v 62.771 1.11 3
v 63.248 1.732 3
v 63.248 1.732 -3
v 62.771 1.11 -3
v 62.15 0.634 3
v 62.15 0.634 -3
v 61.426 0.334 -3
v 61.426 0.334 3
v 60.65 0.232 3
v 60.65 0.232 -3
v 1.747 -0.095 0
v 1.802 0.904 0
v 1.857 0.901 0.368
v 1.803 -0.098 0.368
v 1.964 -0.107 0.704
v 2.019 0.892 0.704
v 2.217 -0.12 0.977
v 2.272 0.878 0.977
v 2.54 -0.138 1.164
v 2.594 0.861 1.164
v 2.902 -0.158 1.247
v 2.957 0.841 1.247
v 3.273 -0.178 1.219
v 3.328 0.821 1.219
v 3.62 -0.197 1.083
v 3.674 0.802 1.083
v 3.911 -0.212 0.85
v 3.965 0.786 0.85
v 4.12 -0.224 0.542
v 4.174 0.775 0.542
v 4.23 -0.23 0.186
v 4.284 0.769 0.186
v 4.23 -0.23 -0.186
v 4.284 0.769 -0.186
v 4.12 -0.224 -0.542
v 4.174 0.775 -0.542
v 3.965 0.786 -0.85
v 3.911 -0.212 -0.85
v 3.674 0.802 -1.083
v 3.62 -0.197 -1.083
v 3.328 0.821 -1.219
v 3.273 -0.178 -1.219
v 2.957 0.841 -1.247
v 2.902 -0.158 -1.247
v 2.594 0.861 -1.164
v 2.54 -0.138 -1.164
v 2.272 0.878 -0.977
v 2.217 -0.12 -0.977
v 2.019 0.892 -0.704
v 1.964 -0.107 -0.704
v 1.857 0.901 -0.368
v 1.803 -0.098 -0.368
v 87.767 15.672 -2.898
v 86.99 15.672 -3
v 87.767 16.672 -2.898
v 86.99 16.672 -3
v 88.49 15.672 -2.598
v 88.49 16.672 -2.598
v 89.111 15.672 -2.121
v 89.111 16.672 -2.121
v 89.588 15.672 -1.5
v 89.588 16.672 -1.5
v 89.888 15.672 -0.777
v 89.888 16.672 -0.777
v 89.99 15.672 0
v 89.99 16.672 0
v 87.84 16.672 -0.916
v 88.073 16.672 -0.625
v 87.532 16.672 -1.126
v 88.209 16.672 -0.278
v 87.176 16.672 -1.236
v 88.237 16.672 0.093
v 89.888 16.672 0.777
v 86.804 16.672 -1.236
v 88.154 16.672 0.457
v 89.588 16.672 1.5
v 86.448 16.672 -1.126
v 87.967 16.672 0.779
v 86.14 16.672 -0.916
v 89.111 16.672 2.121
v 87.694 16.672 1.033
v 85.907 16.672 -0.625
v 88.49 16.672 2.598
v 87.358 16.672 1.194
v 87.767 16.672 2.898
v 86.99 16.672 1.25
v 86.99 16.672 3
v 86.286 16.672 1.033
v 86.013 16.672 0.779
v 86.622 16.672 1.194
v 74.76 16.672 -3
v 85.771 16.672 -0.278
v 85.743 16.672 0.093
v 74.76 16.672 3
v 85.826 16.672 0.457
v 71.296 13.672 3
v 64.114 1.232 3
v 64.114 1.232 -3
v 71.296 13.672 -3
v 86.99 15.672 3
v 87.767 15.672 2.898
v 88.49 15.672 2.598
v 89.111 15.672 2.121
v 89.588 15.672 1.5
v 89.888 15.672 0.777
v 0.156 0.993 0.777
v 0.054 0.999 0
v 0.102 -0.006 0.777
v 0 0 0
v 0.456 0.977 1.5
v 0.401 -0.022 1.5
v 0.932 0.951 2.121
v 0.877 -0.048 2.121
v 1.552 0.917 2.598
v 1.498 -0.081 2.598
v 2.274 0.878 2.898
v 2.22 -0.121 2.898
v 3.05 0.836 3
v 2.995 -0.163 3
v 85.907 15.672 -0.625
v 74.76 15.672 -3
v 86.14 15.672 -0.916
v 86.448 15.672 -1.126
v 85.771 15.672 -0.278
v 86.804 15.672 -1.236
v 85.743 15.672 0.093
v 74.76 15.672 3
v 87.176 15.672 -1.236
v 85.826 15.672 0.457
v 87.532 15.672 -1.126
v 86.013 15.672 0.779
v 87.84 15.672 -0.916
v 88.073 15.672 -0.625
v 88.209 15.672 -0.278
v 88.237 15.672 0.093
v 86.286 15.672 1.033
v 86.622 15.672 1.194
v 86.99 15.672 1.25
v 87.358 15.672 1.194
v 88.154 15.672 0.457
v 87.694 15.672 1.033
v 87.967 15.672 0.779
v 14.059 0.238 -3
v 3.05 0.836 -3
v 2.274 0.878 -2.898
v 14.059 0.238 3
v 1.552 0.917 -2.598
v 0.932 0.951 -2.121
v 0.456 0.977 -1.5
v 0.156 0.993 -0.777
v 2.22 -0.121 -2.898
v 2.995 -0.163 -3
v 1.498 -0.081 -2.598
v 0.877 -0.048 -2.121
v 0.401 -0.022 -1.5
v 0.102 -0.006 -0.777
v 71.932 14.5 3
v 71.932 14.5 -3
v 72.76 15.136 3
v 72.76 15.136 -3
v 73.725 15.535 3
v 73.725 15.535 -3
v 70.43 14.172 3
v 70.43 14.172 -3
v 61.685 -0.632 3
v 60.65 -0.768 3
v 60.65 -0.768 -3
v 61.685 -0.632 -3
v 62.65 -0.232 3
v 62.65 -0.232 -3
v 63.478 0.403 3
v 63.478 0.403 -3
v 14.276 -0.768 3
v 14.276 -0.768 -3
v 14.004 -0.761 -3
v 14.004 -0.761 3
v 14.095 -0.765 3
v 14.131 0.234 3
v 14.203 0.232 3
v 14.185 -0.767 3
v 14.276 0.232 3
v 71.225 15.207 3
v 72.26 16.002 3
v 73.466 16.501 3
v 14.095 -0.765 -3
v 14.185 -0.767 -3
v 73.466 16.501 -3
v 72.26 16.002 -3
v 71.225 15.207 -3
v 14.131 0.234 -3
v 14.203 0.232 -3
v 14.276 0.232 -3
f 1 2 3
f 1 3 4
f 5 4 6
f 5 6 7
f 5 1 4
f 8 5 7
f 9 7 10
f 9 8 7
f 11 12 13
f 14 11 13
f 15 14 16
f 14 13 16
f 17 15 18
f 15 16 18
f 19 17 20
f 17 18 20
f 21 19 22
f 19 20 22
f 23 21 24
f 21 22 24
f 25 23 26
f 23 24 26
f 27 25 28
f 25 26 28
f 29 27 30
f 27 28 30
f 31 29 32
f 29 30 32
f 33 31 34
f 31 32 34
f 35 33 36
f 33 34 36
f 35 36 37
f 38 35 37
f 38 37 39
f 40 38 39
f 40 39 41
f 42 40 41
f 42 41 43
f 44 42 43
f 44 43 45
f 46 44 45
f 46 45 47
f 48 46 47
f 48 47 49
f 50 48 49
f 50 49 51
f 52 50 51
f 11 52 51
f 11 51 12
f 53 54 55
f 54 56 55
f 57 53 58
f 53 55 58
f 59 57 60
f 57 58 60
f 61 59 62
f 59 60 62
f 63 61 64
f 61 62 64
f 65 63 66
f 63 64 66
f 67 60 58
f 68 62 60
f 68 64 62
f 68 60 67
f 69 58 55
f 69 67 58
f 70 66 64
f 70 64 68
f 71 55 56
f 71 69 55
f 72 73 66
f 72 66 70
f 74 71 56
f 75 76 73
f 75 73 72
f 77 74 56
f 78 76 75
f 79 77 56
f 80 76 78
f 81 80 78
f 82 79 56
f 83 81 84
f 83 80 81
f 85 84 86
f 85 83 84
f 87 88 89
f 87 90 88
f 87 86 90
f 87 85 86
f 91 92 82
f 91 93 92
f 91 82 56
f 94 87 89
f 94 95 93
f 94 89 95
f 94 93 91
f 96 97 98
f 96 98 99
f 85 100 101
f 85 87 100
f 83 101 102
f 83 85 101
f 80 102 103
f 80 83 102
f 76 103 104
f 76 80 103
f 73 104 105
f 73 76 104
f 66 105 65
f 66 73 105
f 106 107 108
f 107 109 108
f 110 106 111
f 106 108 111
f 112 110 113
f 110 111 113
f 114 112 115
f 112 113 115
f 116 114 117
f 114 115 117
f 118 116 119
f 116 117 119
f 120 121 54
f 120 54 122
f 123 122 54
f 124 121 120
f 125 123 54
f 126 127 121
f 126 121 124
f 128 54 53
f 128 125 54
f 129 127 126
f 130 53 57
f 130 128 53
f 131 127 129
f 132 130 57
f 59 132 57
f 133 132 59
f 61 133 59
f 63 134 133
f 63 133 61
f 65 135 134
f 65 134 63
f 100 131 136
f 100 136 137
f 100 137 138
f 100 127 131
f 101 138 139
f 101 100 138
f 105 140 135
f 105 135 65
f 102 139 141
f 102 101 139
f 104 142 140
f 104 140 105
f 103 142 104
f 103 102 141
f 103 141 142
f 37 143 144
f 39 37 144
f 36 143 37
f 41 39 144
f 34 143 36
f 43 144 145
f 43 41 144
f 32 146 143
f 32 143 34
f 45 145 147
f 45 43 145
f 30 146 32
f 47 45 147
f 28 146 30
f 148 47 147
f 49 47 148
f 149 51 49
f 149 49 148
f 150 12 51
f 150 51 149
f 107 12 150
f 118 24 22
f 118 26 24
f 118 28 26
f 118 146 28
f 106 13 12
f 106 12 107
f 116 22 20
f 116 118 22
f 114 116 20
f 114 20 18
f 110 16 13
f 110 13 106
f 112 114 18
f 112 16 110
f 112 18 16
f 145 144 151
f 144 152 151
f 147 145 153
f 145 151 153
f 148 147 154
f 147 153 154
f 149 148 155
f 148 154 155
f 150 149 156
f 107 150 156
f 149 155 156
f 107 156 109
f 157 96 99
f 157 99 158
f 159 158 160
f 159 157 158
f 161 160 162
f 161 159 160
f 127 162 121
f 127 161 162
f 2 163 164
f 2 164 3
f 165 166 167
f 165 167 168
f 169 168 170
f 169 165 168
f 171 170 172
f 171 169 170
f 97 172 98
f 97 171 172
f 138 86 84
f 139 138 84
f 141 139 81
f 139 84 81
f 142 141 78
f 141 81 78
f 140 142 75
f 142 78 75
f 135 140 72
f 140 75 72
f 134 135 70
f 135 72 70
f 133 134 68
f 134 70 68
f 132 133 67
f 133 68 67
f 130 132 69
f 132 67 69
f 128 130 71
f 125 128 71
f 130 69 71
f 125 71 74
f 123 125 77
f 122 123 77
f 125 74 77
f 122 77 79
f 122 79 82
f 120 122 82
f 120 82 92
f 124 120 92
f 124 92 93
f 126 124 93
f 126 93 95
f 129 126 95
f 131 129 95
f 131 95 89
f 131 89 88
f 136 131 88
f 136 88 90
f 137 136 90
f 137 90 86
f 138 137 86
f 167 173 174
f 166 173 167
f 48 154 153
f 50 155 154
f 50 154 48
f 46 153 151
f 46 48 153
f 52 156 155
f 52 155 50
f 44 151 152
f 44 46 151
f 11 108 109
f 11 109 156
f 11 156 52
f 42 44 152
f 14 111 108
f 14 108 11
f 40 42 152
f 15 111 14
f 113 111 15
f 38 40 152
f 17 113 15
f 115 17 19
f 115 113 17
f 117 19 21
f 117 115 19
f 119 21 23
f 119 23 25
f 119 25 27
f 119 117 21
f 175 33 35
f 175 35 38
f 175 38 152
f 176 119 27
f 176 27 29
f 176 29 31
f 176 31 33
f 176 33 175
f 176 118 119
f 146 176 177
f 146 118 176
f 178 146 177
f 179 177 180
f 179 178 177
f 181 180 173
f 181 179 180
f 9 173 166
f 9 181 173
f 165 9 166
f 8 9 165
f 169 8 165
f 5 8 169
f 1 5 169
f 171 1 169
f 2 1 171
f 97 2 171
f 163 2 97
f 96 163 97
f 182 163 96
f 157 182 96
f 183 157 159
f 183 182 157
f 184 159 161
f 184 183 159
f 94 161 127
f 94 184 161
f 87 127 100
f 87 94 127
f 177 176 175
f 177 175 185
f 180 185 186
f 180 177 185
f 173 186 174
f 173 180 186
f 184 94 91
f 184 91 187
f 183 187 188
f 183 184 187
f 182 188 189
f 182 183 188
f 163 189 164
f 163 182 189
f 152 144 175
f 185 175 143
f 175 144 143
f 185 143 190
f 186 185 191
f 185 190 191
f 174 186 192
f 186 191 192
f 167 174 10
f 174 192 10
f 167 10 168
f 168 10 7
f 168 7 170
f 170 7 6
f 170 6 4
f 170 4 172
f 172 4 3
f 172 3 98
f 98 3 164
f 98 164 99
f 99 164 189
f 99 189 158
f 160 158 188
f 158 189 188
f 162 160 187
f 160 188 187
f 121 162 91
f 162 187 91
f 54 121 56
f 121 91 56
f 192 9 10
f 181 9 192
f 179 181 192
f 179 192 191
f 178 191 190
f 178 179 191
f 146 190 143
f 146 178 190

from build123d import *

# Parameters (mm, degrees)
EXTRUDE_THIN1_DEPTH = 3
CUT_EXTRUDE1_REACH  = 93.341
SKETCH2_R           = 1.25
CUT_EXTRUDE2_REACH  = 93.713
SKETCH3_R           = 1.25
FILLET1_R           = 3


with BuildPart() as part:
    # Sketch1 → Extrude-Thin1 (new, symmetric)
    with BuildSketch(Plane.XY):
        with BuildLine():
            Line((0, 0), (14.004467228, -0.760906267))
            ThreePointArc((14.004467228, -0.760906267), (14.140049985, -0.766428865), (14.275732677, -0.768270184))
            Line((14.275732677, -0.768270184), (60.65, -0.768270184))
            ThreePointArc((60.65, -0.768270184), (62.65, -0.232371799), (64.114101615, 1.231729816))
            Line((64.114101615, 1.231729816), (71.296338964, 13.671729816))
            ThreePointArc((71.296338964, 13.671729816), (72.760440579, 15.135831431), (74.760440579, 15.671729816))
            Line((74.760440579, 15.671729816), (89.99, 15.671729816))
            Line((89.99, 15.671729816), (89.99, 16.671729816))
            Line((89.99, 16.671729816), (74.760440579, 16.671729816))
            ThreePointArc((74.760440579, 16.671729816), (72.260440579, 16.001856835), (70.43031356, 14.171729816))
            Line((70.43031356, 14.171729816), (63.248076211, 1.731729816))
            ThreePointArc((63.248076211, 1.731729816), (62.15, 0.633653605), (60.65, 0.231729816))
            Line((60.65, 0.231729816), (14.275732677, 0.231729816))
            ThreePointArc((14.275732677, 0.231729816), (14.167186524, 0.233202871), (14.058720318, 0.23762095))
            Line((14.058720318, 0.23762095), (0.05425309, 0.998527217))
            Line((0.05425309, 0.998527217), (0, 0))
        make_face()
    extrude(amount=EXTRUDE_THIN1_DEPTH, both=True)

    # Sketch2 → Cut-Extrude1 (cut, up to next)
    with BuildSketch(Plane(origin=(0.054253089686214166, 0.9985272165842555, 0), x_dir=(0.998527216584255, -0.05425308968621415, 0), z_dir=(0.054253089686214145, 0.9985272165842549, 0)), mode=Mode.PRIVATE) as cut_extrude1_sk1:
        with Locations(Location((3, 0, 0), (0, 0, 180))):
            Circle(SKETCH2_R)
    cut_extrude1_tool1 = extrude(cut_extrude1_sk1.sketch, amount=-CUT_EXTRUDE1_REACH, mode=Mode.PRIVATE) & part.part
    add(cut_extrude1_tool1.solids().sort_by_distance((3.049835, 0.835768, 0))[0], mode=Mode.SUBTRACT)

    # Sketch3 → Cut-Extrude2 (cut, up to next)
    with BuildSketch(Plane(origin=(0, 16.671729816, 0), x_dir=(1, 0, 0), z_dir=(0, 1, 0)), mode=Mode.PRIVATE) as cut_extrude2_sk1:
        with Locations(Location((86.99, 0, 0), (0, 0, 270))):
            Circle(SKETCH3_R)
    cut_extrude2_tool1 = extrude(cut_extrude2_sk1.sketch, amount=-CUT_EXTRUDE2_REACH, mode=Mode.PRIVATE) & part.part
    add(cut_extrude2_tool1.solids().sort_by_distance((86.99, 16.67173, 0))[0], mode=Mode.SUBTRACT)

    # Fillet1
    fillet1_edges = [part.edges().sort_by_distance(p)[0] for p in [
        (0.027126545, 0.499263608, -3),
        (0.027126545, 0.499263608, 3),
        (89.99, 16.171729816, -3),
        (89.99, 16.171729816, 3),
    ]]
    fillet(fillet1_edges, radius=FILLET1_R - 0.0001)  # a hair under: the kernel refuses the full size


solid = part.part
